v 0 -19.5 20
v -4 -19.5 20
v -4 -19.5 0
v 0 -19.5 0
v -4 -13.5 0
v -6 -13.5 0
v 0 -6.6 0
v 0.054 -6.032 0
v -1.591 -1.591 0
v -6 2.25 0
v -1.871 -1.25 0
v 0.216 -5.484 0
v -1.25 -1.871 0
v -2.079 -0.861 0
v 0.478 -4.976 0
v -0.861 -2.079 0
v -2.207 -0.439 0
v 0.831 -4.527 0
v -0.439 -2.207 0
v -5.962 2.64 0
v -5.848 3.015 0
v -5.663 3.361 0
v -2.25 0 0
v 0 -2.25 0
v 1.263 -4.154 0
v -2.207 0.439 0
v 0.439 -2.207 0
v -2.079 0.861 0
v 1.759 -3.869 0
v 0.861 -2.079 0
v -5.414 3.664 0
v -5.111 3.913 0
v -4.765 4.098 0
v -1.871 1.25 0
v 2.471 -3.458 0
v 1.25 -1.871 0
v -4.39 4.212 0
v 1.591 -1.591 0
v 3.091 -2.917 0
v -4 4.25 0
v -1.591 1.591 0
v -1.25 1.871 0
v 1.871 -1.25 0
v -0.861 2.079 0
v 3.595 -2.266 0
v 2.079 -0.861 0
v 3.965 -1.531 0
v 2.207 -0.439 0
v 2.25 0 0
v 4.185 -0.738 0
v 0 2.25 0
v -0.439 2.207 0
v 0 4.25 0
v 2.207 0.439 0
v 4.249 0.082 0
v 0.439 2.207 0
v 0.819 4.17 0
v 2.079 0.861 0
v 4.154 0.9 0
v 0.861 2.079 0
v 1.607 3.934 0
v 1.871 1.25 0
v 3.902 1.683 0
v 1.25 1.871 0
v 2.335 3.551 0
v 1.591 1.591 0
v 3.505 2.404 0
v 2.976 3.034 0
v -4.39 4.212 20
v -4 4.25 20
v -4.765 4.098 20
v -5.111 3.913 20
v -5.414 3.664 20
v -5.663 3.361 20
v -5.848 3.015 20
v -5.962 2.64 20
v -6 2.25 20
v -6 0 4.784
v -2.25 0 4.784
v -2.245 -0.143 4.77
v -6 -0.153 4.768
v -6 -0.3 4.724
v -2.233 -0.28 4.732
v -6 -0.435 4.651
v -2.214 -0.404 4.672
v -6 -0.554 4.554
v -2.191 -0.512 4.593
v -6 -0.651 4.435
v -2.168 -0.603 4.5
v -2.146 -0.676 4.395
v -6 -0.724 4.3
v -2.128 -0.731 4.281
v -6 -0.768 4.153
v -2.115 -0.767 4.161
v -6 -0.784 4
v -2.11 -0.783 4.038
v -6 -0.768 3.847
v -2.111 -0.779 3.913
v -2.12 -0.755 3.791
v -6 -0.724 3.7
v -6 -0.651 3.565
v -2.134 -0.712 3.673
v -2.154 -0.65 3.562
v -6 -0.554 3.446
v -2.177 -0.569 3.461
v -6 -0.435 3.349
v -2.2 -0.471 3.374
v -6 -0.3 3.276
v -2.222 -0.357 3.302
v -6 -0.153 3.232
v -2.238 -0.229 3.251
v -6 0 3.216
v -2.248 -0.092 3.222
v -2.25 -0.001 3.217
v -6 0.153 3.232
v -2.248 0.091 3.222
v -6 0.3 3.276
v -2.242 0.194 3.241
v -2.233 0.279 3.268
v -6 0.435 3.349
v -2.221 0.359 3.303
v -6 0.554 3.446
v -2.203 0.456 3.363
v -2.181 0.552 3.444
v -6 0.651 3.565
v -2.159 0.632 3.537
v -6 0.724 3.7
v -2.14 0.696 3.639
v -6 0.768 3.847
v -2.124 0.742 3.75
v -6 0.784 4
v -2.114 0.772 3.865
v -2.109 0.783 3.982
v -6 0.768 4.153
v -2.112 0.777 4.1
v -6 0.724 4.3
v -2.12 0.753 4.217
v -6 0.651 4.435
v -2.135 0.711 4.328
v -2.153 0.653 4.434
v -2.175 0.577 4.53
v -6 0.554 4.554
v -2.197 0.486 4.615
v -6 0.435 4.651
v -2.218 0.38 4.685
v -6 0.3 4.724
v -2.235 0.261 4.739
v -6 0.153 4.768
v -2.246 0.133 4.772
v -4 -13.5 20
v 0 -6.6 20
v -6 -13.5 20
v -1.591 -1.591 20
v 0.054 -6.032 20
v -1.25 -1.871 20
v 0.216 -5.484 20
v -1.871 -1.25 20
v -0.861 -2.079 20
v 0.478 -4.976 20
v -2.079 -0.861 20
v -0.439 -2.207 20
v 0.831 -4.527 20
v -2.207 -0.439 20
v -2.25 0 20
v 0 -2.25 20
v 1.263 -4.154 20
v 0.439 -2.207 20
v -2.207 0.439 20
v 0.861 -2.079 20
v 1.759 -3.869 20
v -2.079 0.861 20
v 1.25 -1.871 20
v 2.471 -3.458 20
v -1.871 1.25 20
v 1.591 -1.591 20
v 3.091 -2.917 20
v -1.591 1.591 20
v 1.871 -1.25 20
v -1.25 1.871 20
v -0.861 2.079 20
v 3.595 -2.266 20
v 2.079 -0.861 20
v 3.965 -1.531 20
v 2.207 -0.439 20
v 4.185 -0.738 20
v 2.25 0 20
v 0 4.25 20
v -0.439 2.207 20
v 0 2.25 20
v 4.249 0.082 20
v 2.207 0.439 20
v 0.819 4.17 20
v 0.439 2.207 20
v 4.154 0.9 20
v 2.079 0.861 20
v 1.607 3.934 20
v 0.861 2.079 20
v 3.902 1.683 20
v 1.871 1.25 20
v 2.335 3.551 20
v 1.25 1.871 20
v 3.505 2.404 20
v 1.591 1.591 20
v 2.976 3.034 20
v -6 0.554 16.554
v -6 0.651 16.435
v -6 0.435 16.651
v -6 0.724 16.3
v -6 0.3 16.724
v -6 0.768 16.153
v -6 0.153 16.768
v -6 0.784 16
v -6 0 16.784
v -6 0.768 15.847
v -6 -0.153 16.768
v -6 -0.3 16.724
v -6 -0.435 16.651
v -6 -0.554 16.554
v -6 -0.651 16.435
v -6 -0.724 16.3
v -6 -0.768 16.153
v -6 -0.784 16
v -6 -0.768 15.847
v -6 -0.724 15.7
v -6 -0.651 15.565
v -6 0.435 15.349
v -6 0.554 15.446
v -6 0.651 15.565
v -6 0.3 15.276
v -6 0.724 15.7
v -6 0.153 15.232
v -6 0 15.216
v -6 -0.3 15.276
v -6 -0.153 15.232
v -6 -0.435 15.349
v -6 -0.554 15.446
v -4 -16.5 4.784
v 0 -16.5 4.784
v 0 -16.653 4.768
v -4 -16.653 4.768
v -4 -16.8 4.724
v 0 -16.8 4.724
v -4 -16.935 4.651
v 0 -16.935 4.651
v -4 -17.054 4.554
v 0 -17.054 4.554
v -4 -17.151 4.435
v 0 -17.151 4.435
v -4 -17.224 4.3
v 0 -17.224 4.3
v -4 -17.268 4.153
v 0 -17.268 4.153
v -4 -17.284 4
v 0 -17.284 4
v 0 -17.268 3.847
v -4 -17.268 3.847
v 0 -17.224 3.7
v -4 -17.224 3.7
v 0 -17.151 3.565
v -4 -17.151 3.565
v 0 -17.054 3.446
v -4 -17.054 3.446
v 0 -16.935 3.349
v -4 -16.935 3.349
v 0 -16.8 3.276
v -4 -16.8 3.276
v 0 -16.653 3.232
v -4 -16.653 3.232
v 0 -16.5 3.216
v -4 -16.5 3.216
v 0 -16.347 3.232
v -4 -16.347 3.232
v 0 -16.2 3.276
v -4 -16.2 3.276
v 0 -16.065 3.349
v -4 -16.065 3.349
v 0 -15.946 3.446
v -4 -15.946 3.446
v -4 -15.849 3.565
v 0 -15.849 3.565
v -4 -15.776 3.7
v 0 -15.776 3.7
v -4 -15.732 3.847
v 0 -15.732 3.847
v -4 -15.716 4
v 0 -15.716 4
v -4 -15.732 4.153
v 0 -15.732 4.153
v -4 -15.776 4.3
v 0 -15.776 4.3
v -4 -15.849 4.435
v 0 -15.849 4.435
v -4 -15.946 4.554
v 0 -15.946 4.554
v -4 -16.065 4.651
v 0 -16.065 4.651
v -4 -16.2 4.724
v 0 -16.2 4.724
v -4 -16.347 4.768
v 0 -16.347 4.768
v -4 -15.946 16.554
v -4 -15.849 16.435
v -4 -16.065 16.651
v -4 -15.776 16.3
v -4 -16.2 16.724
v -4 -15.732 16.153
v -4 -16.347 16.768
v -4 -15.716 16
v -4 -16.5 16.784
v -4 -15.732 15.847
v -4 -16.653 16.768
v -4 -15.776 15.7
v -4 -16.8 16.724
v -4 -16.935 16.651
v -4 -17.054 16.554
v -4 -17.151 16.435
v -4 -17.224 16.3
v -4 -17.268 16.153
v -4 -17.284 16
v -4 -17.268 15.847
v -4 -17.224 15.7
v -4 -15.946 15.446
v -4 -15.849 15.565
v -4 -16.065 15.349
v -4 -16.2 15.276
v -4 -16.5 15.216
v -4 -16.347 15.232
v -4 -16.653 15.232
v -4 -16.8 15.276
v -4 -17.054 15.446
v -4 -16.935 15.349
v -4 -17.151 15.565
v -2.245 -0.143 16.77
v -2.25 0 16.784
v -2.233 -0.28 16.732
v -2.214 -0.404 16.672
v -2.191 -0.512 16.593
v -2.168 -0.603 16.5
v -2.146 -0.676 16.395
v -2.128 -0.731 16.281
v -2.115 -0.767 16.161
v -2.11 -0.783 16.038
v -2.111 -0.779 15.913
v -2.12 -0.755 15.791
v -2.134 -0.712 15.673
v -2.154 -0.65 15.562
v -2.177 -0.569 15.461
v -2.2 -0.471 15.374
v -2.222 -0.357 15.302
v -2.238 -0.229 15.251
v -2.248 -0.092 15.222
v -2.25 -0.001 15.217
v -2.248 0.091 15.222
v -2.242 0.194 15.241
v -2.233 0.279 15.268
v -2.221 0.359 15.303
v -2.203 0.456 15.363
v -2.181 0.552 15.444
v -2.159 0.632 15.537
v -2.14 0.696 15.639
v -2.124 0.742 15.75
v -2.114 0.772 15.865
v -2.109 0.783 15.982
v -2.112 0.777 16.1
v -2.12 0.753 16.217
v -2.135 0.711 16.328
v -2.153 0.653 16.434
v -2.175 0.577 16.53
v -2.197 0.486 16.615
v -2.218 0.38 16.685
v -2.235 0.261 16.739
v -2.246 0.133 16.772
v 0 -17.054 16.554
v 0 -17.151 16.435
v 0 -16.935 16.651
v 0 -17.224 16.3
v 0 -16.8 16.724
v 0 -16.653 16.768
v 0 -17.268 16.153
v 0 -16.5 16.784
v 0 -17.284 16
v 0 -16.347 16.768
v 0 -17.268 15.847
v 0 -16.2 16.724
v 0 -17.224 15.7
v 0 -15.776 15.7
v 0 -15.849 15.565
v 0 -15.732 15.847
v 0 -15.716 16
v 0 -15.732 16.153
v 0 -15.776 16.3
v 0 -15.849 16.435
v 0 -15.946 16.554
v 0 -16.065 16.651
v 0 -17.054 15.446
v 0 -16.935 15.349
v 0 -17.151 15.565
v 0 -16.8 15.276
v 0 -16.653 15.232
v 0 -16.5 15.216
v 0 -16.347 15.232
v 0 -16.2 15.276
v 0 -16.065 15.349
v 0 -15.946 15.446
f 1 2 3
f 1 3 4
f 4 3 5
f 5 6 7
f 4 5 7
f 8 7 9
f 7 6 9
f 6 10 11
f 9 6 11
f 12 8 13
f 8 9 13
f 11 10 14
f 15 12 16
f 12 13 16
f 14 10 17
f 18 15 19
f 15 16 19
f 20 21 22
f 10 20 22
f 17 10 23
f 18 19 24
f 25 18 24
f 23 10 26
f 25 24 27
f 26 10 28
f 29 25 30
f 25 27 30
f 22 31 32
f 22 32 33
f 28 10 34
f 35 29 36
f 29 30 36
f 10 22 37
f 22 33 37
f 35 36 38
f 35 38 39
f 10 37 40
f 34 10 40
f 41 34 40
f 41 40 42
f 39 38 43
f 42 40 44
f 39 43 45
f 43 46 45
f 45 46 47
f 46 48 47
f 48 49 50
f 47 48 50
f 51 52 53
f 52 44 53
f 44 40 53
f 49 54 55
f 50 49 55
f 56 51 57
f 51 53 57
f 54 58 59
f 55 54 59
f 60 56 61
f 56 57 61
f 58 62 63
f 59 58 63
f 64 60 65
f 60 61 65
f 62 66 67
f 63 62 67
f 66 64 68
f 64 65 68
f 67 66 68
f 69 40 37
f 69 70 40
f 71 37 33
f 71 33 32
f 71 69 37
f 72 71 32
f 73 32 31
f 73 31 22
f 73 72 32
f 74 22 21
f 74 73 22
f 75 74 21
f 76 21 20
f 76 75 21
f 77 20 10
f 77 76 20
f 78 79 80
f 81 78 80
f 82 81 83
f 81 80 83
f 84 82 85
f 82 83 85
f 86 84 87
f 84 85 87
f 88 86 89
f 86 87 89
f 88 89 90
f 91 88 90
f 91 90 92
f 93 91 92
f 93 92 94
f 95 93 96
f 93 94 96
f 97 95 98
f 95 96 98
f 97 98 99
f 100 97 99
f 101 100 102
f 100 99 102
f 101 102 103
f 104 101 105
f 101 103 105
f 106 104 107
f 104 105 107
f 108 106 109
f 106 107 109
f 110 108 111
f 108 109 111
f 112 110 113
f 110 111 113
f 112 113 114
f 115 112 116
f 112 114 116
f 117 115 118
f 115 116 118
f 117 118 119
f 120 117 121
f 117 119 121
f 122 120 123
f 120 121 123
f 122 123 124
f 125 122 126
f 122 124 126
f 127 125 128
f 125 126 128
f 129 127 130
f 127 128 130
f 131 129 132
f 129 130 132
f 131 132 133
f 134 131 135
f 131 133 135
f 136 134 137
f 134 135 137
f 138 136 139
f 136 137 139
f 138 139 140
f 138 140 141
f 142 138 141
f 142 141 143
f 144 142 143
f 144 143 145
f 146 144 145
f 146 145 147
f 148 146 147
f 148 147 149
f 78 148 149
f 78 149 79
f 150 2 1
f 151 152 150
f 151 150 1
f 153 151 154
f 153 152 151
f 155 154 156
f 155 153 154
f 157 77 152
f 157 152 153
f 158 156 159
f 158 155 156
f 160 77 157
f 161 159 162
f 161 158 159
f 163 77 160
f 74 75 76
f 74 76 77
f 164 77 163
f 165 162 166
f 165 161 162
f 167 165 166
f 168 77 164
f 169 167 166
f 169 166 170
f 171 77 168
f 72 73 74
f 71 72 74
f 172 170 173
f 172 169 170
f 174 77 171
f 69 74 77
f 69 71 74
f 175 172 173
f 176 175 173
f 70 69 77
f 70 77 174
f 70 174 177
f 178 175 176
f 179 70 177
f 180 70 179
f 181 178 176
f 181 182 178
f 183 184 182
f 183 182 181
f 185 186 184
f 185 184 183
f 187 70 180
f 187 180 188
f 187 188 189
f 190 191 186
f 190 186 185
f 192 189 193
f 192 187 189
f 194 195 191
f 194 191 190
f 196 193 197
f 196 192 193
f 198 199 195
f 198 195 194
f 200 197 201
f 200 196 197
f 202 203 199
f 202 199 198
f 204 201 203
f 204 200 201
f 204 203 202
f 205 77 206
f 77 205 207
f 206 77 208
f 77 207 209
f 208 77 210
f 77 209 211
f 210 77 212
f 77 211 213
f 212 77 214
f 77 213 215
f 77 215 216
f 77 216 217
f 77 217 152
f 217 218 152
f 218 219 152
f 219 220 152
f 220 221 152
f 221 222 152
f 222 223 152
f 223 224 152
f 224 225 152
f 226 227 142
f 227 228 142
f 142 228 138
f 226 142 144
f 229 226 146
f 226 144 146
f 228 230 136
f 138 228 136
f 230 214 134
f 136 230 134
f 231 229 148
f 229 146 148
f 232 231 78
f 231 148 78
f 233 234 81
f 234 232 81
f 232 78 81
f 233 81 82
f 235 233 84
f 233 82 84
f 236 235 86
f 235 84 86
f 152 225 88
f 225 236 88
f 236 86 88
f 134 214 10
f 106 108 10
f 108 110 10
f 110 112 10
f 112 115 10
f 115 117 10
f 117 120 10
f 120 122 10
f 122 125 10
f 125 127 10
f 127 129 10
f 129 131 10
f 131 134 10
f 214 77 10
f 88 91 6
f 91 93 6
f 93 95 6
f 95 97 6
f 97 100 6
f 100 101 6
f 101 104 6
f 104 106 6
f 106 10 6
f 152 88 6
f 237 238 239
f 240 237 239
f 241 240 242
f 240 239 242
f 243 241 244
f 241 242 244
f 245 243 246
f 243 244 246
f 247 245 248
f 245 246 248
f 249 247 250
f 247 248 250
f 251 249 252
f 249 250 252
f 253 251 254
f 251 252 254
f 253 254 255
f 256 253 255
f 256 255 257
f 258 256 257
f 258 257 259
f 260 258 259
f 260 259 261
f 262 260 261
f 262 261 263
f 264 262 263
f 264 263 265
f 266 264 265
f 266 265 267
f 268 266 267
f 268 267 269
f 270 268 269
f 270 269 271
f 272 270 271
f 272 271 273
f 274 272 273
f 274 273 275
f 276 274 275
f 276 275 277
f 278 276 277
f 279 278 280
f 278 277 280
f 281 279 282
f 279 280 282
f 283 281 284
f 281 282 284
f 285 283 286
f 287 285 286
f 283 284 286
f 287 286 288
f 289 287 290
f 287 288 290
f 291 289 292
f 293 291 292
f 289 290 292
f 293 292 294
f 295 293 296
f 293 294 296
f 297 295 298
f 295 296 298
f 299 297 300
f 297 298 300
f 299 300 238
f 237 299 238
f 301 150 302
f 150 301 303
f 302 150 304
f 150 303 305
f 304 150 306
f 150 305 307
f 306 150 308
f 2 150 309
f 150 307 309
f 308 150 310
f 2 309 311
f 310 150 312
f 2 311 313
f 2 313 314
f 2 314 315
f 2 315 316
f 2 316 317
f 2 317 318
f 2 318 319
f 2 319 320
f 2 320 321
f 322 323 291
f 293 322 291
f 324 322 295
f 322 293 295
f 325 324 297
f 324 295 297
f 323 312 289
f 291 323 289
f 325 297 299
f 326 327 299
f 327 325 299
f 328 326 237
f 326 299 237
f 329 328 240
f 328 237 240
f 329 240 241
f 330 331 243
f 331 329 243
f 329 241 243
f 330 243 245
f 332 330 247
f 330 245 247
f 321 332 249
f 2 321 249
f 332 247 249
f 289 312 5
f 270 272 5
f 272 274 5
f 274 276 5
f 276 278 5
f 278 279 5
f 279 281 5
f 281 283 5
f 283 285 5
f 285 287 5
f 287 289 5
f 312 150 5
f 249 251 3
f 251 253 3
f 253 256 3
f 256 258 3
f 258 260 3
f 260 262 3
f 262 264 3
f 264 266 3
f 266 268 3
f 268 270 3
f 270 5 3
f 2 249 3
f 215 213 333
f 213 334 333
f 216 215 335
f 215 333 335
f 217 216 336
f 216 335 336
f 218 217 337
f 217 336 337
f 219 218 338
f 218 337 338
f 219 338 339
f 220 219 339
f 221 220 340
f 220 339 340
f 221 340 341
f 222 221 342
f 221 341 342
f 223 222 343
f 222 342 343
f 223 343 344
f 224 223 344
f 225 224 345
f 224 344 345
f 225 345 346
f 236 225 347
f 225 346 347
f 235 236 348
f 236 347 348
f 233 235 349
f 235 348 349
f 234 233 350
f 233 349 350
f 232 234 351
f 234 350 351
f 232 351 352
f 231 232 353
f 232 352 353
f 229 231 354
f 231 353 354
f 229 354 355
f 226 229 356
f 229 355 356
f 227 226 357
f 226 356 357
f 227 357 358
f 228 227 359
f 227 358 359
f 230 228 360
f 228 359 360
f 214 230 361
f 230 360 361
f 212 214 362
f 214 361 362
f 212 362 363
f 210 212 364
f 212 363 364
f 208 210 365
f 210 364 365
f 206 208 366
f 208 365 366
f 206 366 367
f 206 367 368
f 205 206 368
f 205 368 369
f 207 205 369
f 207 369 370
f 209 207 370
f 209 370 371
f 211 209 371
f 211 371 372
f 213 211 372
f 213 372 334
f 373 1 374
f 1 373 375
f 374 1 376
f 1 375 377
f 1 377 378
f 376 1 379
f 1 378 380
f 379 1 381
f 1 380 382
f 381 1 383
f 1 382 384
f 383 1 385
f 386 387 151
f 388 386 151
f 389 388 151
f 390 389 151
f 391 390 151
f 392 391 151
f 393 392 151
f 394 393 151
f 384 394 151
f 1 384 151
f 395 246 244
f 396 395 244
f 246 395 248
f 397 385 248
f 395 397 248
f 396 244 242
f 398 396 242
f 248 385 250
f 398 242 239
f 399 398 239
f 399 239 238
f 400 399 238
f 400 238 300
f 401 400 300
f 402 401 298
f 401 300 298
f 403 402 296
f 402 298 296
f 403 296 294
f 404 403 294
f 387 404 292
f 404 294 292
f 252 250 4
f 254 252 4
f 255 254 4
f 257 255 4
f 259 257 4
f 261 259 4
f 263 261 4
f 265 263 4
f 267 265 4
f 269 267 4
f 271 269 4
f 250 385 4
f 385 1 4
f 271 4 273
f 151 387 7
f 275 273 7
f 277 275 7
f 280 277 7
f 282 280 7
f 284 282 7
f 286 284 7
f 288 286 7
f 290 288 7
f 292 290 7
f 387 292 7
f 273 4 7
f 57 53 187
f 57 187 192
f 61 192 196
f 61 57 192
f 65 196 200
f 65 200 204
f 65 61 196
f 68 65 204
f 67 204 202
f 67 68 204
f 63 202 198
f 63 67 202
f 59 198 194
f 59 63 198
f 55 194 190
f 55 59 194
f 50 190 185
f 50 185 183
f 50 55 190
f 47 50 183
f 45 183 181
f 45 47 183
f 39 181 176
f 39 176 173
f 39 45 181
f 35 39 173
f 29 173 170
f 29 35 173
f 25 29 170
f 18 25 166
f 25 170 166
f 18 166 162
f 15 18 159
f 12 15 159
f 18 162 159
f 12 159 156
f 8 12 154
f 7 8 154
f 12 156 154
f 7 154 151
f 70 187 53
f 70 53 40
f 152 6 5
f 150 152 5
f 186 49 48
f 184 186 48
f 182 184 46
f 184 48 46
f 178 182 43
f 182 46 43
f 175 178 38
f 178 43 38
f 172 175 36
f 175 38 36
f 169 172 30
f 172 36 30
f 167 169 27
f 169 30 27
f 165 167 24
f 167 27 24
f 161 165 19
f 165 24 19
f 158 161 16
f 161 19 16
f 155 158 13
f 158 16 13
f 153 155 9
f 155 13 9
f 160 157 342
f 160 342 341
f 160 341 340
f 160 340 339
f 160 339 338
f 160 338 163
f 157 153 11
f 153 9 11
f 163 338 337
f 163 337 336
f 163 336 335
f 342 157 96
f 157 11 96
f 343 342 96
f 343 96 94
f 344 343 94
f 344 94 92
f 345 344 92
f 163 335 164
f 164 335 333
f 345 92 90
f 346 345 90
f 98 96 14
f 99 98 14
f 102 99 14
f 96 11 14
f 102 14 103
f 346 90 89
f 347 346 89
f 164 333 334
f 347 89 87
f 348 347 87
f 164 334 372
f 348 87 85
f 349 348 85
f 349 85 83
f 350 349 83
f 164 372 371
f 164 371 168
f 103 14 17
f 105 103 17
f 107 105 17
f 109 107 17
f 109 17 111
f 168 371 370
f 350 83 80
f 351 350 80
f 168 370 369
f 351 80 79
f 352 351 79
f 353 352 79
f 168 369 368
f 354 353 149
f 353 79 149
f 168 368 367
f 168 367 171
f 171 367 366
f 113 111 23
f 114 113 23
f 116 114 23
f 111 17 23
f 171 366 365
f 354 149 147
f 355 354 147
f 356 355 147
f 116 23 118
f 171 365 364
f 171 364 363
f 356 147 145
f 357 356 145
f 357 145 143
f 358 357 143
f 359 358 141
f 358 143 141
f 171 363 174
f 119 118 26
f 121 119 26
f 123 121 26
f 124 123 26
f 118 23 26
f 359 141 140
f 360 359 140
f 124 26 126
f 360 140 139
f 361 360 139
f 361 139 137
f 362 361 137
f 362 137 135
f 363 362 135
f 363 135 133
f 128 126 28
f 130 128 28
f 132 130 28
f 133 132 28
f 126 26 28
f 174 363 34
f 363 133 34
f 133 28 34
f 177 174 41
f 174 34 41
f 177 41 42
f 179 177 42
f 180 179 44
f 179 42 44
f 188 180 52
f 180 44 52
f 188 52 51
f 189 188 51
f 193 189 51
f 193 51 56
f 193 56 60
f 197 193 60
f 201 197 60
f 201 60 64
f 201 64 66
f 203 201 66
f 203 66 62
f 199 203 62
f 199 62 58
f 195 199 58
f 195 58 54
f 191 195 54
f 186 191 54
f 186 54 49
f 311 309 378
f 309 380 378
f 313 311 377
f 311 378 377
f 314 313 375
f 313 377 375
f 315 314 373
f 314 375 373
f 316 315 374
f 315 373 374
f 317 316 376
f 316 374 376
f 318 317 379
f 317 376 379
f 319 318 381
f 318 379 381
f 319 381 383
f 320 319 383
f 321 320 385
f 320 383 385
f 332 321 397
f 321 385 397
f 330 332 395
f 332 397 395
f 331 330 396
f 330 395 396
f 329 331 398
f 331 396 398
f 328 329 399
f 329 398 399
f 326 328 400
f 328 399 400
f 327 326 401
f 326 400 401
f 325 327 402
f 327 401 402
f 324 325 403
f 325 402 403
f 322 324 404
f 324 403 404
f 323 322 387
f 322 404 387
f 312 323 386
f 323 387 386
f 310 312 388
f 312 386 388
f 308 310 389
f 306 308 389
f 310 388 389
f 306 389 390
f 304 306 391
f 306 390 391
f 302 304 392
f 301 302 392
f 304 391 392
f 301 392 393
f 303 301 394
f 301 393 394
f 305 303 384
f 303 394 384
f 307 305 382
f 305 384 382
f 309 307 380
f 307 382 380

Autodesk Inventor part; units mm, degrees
ref_plane "YZ Plane" through (0, 0, 0) normal (1, 0, 0) x (0, 1, 0)
ref_plane "XZ Plane" through (0, 0, 0) normal (0, 1, 0) x (-1, 0, 0)
ref_plane "XY Plane" through (0, 0, 0) normal (0, 0, 1) x (1, 0, 0)
sketch "Skizze1" plane through (0, 0, 0) normal (0, 0, 1) x (1, 0, 0)
  circle A0 centre (0, 0) radius 2.25
  line L0 (0, 4.25) -> (-6, 4.25)
  line L1 (-6, 4.25) -> (-6, -13.5)
  line L2 (-6, -13.5) -> (-4, -13.5)
  line L3 (-4, -13.5) -> (-4, -19.5)
  line L4 (-4, -19.5) -> (0, -19.5)
  line L5 (0, -19.5) -> (0, -4.25)
  arc A1 (0, -4.25) -> (0, 4.25) centre (0, 0) ccw
  line L6 (0, 9) -> (0, -24.25) projected
  line L7 (-8.05, 0) -> (6.3, 0) projected
  dimension "d0" = 4.5
  dimension "d1" = 4
  dimension "d2" = 2
  dimension "d3" = 2
  dimension "d4" = 13.5
  dimension "d5" = 6
extrude "Extrusion1" add sketch "Skizze1" along normal blind 20 contours L7 A1 L6 A0 | A0 L6 A1 L7 | A0 L7 L1 L0 L6 | L6 L5 L4 L3 L2 L1 L7 A0
sketch "Skizze2" plane through (-6, -13.5, 0) normal (-1, 0, 0) x (0, 0, 1)
  line L0 (20, 0) -> (20, 17.75) projected
  line L1 (0, 17.75) -> (0, 0) projected
  line L2 (0, 15.75) -> (20, 15.75) projected
  line L3 (0, 11.25) -> (20, 11.25) projected
  point P0 (0, 13.5)
  point P1 (4, 13.5)
  point P2 (16, 13.5)
  dimension "d8" = 4
  dimension "d9" = 4
hole "Bohrung1" at (-6, 0, 4) at (-6, 0, 16) direction (1, 0, 0) diameter 1.567 end up to surface thread size "M2x0.4" class "6H" standard "ISO Metric profile"
sketch "Skizze3" plane through (-4, -19.5, 0) normal (-1, 0, 0) x (0, 0, 1)
  line L0 (20, 0) -> (20, 6) projected
  line L1 (0, 6) -> (0, 0) projected
  point P0 (0, 19.5)
  point P1 (4, 3)
  point P2 (16, 3)
  dimension "d17" = 4
  dimension "d18" = 4
hole "Bohrung2" at (-4, -16.5, 4) at (-4, -16.5, 16) direction (1, 0, 0) diameter 1.567 end up to surface thread size "M2x0.4" class "6H" standard "ISO Metric profile"
fillet "Rundung1" radius 2 1 edges at (-6, 4.25, 10)
fillet "Rundung2" radius 3 1 edges at (0, -4.25, 10)
equation "\"d9\" = d8"
equation "\"d18\" = d17"
properties part number "Türarm"
